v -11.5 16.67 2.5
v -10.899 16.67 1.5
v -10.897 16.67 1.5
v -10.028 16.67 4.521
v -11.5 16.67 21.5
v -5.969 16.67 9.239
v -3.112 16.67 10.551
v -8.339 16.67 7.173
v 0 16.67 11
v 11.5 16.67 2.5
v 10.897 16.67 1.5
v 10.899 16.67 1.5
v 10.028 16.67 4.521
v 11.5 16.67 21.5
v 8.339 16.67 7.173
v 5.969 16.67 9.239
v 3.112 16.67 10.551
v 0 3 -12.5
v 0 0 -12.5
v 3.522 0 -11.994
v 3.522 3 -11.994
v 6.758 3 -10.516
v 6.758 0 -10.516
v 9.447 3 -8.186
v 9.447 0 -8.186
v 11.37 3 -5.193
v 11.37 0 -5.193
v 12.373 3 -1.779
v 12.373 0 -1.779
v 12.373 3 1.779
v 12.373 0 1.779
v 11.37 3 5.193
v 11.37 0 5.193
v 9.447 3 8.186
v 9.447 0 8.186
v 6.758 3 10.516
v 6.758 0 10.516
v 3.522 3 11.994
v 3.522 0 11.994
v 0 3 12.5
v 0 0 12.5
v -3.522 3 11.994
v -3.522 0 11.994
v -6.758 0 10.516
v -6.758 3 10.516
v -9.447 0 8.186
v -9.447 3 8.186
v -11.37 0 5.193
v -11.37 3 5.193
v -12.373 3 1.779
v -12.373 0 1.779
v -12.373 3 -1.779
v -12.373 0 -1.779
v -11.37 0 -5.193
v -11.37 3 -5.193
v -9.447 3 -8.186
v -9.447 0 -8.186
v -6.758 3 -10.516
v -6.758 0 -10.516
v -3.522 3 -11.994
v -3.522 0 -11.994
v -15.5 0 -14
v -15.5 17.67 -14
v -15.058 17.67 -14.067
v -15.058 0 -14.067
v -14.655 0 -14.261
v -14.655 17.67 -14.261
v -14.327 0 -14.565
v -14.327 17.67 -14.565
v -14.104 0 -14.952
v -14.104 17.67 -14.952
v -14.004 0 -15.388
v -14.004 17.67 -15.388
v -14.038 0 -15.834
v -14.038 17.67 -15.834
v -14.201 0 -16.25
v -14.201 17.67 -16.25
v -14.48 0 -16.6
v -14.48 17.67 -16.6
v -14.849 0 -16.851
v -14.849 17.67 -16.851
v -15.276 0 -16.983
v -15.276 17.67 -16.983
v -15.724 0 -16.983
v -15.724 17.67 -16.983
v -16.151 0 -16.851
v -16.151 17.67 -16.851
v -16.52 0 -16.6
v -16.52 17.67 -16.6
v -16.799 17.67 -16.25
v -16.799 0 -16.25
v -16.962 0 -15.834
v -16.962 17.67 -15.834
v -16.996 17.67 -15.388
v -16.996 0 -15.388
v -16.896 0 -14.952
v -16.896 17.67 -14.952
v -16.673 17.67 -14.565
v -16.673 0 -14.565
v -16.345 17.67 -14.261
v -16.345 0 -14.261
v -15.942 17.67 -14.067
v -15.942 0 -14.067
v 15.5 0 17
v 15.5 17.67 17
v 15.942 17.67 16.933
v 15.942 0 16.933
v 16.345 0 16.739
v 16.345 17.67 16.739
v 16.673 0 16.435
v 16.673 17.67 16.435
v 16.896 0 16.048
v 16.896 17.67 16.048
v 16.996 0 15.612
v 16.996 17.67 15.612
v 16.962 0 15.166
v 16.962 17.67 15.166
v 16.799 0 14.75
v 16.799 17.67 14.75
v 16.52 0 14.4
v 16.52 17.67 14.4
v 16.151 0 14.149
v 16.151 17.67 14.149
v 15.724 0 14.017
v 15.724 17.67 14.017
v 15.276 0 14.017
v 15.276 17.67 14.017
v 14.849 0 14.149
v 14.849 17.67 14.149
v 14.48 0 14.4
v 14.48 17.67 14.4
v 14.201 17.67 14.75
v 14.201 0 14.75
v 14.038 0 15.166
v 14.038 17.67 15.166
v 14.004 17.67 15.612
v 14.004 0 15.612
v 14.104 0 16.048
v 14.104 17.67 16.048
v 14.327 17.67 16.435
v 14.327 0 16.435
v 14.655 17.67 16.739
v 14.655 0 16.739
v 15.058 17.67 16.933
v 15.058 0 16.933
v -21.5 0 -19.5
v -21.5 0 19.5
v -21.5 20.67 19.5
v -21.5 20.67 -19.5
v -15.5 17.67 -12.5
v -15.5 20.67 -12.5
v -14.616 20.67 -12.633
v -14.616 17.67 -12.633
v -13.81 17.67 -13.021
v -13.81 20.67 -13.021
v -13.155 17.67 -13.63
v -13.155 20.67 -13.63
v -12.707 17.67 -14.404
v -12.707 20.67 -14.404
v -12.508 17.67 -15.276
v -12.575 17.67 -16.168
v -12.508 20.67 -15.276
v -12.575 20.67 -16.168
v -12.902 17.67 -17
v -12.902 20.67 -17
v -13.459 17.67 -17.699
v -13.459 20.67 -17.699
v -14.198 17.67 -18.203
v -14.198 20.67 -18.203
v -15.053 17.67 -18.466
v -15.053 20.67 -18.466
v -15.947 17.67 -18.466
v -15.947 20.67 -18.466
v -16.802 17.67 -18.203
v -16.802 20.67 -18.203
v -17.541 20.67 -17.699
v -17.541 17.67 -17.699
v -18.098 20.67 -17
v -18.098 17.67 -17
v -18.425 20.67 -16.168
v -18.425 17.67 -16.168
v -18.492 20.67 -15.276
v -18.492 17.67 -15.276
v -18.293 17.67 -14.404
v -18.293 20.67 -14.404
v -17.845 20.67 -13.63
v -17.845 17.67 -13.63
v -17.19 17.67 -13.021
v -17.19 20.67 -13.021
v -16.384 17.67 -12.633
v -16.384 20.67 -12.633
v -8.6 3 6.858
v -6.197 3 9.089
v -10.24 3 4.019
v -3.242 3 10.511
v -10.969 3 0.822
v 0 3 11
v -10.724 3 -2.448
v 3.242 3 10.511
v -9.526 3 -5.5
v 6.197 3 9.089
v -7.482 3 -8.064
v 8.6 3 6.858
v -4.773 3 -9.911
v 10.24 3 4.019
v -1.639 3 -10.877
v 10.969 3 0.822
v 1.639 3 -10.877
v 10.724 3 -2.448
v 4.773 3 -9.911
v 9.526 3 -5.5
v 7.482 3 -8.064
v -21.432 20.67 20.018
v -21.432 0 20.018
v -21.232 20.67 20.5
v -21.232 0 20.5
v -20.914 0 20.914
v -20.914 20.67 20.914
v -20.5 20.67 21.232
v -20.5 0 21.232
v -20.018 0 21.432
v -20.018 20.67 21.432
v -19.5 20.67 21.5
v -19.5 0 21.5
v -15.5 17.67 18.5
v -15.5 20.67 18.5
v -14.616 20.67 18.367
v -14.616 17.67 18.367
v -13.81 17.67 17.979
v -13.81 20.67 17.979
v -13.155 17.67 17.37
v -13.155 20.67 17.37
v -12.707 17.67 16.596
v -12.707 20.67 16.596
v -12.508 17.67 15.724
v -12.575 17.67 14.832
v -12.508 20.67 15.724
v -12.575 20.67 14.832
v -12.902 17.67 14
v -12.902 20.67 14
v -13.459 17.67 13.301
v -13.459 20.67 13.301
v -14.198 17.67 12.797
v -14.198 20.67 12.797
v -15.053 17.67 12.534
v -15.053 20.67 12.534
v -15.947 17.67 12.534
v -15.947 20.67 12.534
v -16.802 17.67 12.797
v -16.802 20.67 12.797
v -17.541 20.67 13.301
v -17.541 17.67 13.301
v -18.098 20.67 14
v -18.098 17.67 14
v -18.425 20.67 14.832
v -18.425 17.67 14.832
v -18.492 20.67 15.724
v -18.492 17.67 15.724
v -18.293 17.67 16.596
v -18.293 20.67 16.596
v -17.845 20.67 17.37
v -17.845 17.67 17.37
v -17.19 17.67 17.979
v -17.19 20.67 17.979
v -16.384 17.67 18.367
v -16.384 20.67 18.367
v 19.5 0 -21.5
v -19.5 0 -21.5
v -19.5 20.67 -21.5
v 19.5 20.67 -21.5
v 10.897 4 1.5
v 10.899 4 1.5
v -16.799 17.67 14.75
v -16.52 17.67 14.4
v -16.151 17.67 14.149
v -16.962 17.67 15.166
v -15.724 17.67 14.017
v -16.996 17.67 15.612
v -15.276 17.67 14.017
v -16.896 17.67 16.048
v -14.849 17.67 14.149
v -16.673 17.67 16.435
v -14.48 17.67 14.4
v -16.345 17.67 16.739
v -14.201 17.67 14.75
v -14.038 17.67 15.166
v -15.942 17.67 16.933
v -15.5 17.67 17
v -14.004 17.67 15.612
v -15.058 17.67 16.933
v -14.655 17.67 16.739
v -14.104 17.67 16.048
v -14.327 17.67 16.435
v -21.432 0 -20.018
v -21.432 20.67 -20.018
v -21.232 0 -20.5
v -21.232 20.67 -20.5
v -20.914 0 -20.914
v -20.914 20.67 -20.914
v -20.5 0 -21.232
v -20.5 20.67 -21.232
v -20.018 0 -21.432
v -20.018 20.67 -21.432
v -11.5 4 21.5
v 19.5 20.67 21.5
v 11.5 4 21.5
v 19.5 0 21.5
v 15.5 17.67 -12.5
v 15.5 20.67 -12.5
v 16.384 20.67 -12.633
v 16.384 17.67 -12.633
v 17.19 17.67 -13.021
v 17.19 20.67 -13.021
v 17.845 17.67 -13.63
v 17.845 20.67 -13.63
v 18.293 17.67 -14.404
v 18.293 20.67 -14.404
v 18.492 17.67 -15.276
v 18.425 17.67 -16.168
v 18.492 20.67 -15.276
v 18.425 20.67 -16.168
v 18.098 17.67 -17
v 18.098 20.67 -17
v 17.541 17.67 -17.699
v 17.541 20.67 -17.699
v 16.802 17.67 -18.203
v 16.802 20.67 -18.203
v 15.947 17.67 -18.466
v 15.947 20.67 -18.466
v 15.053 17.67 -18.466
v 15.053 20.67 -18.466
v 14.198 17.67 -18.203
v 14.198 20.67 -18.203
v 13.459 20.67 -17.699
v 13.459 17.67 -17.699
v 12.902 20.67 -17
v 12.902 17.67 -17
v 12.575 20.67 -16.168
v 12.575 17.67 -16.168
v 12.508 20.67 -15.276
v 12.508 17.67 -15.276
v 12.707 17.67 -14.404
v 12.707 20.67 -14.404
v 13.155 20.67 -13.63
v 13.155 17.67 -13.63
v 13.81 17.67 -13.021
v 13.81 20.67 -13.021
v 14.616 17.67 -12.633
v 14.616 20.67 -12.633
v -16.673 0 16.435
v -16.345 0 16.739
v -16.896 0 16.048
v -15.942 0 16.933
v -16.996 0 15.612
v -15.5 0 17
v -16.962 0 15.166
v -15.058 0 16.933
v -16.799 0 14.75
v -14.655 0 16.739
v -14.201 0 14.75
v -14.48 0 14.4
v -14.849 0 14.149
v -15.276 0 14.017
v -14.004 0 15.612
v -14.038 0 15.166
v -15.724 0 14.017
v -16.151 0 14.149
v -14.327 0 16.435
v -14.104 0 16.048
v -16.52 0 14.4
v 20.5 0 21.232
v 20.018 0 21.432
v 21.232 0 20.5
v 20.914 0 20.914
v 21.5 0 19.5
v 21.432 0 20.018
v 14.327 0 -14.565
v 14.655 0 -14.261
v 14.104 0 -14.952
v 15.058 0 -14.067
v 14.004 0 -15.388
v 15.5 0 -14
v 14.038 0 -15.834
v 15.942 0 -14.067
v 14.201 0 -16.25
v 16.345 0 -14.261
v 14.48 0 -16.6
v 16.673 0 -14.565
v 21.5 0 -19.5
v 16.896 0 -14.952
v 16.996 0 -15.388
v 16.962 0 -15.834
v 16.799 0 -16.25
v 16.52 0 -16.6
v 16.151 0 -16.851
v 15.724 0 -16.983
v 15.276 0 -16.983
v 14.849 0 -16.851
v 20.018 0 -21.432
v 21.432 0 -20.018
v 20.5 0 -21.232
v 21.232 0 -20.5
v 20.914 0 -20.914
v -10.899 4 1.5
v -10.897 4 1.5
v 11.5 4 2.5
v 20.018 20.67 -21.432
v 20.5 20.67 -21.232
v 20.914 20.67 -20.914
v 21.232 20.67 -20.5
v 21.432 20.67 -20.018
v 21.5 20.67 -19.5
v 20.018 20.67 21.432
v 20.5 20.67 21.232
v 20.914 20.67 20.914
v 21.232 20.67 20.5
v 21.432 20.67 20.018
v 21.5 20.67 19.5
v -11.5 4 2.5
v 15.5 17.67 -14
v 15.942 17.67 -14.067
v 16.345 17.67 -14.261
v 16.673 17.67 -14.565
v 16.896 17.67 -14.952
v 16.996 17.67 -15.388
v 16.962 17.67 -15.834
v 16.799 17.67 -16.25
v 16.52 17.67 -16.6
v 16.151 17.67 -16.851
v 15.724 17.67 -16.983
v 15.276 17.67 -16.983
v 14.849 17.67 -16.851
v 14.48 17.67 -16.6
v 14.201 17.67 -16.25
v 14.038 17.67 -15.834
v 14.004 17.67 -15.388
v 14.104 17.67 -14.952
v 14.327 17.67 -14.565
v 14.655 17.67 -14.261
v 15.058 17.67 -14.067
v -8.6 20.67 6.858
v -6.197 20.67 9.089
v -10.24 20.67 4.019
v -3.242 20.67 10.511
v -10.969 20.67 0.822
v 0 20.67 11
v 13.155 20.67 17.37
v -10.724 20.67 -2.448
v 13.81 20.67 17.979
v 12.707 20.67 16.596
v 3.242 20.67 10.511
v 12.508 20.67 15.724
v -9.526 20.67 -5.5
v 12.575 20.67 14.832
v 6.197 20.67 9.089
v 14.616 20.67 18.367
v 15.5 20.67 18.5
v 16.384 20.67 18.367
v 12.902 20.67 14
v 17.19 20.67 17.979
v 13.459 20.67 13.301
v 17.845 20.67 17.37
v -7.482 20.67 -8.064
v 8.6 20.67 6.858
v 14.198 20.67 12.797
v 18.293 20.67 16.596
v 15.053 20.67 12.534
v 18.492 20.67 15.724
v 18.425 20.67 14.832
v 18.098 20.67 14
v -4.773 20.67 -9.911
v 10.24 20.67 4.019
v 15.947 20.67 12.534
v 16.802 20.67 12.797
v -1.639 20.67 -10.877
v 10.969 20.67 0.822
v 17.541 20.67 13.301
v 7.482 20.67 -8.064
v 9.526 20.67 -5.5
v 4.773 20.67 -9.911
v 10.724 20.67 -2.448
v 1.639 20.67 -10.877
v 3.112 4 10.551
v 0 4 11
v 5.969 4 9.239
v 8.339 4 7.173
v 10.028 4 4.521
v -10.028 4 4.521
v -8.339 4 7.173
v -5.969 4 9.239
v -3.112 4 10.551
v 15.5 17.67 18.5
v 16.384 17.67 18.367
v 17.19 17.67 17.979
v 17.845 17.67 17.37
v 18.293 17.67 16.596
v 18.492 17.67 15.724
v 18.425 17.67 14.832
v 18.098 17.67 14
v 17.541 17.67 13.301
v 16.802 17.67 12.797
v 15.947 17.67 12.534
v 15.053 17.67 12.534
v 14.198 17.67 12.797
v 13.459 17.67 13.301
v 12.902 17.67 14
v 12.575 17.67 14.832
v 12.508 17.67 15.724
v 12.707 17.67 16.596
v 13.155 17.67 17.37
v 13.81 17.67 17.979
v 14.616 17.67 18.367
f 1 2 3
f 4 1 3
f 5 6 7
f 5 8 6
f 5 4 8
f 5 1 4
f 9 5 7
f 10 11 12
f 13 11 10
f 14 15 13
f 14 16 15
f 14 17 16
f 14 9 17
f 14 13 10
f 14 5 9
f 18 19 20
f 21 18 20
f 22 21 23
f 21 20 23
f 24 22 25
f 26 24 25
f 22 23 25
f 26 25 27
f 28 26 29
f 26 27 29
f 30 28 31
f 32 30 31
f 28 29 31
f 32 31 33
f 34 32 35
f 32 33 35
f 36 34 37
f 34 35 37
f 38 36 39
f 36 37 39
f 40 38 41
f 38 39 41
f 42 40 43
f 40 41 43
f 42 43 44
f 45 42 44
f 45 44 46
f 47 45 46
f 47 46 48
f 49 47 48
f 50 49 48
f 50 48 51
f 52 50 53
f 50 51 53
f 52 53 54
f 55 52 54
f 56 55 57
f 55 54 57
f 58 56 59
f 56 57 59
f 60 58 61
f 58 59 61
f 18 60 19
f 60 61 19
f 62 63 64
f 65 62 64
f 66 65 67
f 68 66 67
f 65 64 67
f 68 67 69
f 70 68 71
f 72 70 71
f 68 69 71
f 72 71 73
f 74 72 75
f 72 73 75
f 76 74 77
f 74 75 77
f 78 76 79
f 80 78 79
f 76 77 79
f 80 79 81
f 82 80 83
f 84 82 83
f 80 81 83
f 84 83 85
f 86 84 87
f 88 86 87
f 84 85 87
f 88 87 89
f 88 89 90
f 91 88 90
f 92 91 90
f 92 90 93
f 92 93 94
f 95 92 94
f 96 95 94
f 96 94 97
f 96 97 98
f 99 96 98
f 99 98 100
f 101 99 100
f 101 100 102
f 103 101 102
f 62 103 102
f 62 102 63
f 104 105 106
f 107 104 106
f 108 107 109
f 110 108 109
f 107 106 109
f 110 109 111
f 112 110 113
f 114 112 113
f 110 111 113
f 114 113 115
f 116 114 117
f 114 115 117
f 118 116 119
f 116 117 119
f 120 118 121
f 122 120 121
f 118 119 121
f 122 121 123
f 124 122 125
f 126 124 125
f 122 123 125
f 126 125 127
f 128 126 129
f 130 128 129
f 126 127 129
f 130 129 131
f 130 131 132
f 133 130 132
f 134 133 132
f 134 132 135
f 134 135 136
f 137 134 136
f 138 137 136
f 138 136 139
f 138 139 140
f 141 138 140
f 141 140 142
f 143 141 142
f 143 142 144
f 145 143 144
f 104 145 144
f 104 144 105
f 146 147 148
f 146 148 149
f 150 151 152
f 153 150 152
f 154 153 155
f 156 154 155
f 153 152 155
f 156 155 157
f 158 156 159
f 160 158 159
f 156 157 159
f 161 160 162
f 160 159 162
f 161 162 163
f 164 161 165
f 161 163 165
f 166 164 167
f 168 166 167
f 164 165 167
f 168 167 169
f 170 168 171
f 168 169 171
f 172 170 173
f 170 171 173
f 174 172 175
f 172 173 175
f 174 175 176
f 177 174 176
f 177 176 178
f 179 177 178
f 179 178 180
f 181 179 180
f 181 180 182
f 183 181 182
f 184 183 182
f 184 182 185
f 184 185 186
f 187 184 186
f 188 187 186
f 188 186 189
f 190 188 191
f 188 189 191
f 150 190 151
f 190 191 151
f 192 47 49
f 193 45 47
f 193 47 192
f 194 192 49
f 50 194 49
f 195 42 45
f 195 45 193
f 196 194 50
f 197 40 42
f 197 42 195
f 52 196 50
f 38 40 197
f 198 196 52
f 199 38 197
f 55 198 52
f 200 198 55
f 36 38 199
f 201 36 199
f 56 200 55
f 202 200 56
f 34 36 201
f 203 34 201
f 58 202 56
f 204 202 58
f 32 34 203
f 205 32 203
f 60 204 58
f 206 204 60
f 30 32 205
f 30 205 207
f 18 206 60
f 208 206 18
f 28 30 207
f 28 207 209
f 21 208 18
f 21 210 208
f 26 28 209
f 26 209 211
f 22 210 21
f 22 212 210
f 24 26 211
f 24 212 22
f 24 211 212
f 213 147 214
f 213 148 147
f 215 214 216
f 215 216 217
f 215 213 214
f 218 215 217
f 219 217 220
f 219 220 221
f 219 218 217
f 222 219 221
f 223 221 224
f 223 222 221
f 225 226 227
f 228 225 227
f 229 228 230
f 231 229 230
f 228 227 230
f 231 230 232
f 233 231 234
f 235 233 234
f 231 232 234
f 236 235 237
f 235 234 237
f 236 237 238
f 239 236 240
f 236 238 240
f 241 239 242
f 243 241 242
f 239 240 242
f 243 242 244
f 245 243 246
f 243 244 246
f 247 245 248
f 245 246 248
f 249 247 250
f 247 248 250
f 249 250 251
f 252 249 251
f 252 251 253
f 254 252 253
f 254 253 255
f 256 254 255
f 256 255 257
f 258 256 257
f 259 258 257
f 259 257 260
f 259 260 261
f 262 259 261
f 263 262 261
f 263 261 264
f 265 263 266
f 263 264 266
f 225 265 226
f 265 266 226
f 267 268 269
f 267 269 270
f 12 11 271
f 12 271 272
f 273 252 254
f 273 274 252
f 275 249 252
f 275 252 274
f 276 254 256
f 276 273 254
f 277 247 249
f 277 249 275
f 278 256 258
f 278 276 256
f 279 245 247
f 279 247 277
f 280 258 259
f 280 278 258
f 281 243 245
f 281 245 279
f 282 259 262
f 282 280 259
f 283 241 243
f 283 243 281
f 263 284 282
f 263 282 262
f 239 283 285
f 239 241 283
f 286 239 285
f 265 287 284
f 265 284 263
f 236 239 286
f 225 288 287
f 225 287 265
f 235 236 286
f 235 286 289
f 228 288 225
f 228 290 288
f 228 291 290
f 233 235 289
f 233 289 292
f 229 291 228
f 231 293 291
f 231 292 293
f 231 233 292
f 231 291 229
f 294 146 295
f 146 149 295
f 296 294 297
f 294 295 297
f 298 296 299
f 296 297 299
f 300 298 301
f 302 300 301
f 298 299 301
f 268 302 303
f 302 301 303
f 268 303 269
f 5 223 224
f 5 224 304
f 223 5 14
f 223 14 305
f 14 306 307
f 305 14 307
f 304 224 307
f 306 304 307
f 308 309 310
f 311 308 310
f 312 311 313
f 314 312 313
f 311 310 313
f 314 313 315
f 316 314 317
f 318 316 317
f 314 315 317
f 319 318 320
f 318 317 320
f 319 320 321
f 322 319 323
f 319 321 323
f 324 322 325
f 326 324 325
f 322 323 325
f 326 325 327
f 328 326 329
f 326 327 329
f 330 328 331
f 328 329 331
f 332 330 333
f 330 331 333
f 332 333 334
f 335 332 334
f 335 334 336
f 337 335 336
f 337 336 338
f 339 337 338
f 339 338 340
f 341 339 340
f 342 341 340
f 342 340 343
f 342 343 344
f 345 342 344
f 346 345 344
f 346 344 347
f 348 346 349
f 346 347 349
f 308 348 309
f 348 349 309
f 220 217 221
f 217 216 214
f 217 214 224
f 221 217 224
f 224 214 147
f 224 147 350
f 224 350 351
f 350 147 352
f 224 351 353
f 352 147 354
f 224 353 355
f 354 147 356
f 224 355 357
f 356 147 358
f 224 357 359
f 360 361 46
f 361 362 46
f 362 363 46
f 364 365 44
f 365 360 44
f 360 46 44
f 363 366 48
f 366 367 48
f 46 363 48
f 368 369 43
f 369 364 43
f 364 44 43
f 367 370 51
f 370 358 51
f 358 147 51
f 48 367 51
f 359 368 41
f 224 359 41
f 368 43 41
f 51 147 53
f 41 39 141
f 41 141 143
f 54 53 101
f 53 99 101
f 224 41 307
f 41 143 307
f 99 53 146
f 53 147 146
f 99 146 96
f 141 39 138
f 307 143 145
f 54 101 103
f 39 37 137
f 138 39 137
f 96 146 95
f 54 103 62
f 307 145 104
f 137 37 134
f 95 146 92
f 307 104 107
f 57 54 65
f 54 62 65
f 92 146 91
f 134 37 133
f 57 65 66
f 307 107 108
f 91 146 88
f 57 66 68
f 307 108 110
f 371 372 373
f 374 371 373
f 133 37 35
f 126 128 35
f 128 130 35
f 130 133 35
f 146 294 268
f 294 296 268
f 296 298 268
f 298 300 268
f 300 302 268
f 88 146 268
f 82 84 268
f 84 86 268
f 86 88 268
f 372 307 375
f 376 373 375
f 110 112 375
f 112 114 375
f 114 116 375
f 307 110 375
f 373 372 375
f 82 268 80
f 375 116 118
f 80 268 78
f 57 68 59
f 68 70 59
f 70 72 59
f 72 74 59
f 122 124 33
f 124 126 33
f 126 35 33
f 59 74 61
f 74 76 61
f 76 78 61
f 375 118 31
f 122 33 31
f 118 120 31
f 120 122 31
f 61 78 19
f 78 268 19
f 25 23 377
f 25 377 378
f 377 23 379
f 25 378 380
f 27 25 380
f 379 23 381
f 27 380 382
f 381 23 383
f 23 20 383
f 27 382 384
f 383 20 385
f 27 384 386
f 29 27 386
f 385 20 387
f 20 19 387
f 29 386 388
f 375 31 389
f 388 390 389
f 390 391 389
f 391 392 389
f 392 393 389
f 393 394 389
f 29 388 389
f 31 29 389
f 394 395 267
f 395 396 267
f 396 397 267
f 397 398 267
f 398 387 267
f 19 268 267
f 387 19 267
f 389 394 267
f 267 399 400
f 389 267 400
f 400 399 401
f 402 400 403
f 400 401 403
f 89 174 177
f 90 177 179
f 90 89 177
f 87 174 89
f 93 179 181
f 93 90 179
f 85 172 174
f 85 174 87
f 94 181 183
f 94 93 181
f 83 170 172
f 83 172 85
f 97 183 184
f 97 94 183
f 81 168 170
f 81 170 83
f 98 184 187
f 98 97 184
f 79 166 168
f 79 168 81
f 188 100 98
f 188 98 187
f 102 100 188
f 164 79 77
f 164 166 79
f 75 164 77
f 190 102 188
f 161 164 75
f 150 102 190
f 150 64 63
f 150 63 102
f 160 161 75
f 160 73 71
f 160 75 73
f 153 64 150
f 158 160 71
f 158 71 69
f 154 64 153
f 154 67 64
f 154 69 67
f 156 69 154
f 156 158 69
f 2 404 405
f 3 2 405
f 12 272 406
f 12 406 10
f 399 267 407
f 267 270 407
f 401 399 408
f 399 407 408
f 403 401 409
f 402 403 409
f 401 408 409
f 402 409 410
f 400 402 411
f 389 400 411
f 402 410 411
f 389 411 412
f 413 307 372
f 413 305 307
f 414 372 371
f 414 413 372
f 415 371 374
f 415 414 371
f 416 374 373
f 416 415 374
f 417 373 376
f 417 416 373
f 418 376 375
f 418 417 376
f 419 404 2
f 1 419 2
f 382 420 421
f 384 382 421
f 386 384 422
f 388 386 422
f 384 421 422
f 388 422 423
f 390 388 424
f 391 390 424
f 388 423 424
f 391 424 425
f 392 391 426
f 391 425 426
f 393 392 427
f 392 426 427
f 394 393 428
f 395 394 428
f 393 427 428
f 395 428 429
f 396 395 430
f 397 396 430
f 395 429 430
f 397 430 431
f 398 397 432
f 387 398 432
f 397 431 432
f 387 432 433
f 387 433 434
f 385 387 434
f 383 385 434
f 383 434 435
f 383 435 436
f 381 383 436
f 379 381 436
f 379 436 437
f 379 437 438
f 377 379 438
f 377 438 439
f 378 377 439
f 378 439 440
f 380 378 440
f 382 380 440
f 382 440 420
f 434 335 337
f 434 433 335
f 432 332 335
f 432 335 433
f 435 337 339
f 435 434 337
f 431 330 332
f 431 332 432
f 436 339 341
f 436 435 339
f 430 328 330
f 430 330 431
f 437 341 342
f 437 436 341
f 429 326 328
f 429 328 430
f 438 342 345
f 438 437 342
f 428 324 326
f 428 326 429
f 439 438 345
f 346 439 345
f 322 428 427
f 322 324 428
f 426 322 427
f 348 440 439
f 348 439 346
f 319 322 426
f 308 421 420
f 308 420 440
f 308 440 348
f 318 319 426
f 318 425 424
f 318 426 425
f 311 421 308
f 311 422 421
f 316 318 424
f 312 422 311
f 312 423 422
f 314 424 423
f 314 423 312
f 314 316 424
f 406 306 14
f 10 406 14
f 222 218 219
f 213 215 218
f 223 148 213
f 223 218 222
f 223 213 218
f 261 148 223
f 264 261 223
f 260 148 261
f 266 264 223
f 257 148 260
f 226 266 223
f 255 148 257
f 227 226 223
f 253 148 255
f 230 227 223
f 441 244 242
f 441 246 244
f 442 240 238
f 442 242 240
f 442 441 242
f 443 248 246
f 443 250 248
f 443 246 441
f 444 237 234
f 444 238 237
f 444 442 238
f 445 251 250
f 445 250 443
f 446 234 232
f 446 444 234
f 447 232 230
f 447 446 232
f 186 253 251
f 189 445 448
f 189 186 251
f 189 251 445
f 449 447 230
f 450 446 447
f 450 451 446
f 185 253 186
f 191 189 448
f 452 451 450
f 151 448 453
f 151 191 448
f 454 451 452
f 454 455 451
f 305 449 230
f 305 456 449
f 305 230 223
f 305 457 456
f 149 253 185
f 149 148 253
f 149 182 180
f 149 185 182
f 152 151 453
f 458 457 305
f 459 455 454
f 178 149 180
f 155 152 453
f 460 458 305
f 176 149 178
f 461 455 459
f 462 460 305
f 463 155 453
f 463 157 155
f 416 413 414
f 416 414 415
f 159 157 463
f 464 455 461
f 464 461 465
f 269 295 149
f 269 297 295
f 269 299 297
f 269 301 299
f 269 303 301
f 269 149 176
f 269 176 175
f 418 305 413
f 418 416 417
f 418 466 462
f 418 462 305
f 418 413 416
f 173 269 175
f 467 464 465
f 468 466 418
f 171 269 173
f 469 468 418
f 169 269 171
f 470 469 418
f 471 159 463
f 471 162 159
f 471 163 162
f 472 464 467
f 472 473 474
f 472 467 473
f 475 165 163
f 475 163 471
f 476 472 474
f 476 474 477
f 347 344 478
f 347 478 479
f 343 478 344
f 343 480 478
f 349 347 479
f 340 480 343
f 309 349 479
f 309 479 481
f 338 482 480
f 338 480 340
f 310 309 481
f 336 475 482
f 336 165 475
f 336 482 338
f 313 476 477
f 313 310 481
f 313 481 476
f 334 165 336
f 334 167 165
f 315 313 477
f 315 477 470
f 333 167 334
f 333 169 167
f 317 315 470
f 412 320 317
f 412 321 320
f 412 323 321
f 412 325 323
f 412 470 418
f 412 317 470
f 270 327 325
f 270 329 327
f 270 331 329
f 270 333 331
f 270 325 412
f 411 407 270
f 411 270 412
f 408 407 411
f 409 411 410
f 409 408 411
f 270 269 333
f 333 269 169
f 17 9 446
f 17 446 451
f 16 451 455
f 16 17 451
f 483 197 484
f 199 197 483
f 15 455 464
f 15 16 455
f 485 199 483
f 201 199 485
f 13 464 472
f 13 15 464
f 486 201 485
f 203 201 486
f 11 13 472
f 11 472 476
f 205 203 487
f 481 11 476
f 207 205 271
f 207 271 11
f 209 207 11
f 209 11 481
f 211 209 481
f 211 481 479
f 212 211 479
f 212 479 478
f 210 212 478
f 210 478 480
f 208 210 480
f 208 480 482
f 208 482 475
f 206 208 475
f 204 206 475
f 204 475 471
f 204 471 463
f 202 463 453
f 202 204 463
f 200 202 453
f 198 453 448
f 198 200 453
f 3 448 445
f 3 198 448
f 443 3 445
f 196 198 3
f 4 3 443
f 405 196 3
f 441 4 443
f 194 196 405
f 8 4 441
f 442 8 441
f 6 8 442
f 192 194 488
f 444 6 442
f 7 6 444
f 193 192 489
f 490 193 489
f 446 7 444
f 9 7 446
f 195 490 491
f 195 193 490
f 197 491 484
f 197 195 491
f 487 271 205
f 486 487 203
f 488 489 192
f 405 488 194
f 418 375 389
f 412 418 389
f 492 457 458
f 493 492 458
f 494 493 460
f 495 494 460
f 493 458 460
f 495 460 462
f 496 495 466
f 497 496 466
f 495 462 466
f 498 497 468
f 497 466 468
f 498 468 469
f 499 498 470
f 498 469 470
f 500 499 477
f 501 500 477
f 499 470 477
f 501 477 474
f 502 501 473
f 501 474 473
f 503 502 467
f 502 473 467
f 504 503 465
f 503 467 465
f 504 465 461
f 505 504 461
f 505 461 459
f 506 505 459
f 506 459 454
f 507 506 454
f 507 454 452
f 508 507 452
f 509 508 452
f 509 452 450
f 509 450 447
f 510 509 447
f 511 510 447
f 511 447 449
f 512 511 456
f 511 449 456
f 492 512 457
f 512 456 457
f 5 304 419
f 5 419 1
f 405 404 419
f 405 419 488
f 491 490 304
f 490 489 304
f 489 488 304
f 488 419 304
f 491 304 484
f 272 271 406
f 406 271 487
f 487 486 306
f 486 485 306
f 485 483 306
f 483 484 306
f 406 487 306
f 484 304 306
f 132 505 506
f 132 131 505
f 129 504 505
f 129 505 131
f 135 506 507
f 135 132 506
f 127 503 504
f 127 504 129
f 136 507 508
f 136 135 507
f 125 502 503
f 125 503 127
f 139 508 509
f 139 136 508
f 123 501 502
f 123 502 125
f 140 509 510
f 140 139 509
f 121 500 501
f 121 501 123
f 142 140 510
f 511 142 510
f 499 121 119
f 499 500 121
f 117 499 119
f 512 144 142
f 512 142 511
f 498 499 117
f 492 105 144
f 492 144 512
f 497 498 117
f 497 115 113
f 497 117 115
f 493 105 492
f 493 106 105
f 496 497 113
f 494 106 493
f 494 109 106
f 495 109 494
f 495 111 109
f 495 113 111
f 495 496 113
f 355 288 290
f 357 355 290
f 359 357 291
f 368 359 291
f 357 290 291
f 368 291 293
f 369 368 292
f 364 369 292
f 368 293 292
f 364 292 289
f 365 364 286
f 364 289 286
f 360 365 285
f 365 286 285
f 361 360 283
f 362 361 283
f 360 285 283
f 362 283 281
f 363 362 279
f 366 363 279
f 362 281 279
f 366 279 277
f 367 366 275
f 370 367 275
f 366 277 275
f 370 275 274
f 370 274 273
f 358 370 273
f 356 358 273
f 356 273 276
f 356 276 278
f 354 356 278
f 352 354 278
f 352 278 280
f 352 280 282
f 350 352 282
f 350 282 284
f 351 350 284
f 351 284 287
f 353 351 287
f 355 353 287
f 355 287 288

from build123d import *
from OCP.BRepFilletAPI import BRepFilletAPI_MakeChamfer

# Parameters (mm, degrees)
SKETCH1_W           = 43
SKETCH1_H           = 43
SKETCH1_R           = 11
BOSS_EXTRUDE1_DEPTH = 20.67
SKETCH2_R           = 12.5
CUT_EXTRUDE1_DEPTH  = 3
SKETCH3_R           = 1.5
CUT_EXTRUDE2_DEPTH  = 37.766137953
SKETCH4_W           = 23
SKETCH4_H           = 12.67
CUT_EXTRUDE3_DEPTH  = 20
SKETCH5_R           = 3
CUT_EXTRUDE4_DEPTH  = 3
FILLET1_R           = 2
CHAMFER1_SIZE       = 1
CHAMFER1_SIZE2      = 0.600860619


with BuildPart() as part:
    # Sketch1 → Boss-Extrude1 (new body)
    with BuildSketch(Plane(origin=(0, 0, 0), x_dir=(1, 0, 0), z_dir=(0, 1, 0))):
        Rectangle(SKETCH1_W, SKETCH1_H)
        with Locations(Location((0, 0, 0), (0, 0, 270))):
            Circle(SKETCH1_R, mode=Mode.SUBTRACT)
    extrude(amount=BOSS_EXTRUDE1_DEPTH)

    # Sketch2 → Cut-Extrude1 (cut)
    with BuildSketch(Plane.XZ):
        with Locations(Location((0, 0, 0), (0, 0, 270))):
            Circle(SKETCH2_R)
    extrude(amount=-CUT_EXTRUDE1_DEPTH, mode=Mode.SUBTRACT)

    # Sketch3 → Cut-Extrude2 (cut, through all)
    with BuildSketch(Plane(origin=(0, 20.67, 0), x_dir=(1, 0, 0), z_dir=(0, 1, 0))):
        with Locations(Location((-15.5, 15.5, 0), (0, 0, 270))):
            Circle(SKETCH3_R)
        with Locations(Location((15.5, 15.5, 0), (0, 0, 270))):
            Circle(SKETCH3_R)
        with Locations(Location((15.5, -15.5, 0), (0, 0, 270))):
            Circle(SKETCH3_R)
        with Locations(Location((-15.5, -15.5, 0), (0, 0, 270))):
            Circle(SKETCH3_R)
    extrude(amount=-CUT_EXTRUDE2_DEPTH, mode=Mode.SUBTRACT)

    # Sketch4 → Cut-Extrude3 (cut)
    with BuildSketch(Plane.XY.offset(21.5)):
        with Locations((0, 10.335)):
            Rectangle(SKETCH4_W, SKETCH4_H)
    extrude(amount=-CUT_EXTRUDE3_DEPTH, mode=Mode.SUBTRACT)

    # Sketch5 → Cut-Extrude4 (cut)
    with BuildSketch(Plane(origin=(0, 20.67, 0), x_dir=(1, 0, 0), z_dir=(0, 1, 0))):
        with Locations(Location((-15.5, 15.5, 0), (0, 0, 270))):
            Circle(SKETCH5_R)
        with Locations(Location((15.5, 15.5, 0), (0, 0, 270))):
            Circle(SKETCH5_R)
        with Locations(Location((15.5, -15.5, 0), (0, 0, 270))):
            Circle(SKETCH5_R)
        with Locations(Location((-15.5, -15.5, 0), (0, 0, 270))):
            Circle(SKETCH5_R)
    extrude(amount=-CUT_EXTRUDE4_DEPTH, mode=Mode.SUBTRACT)

    # Fillet1
    fillet1_edges = [part.edges().sort_by_distance(p)[0] for p in [
        (21.5, 10.335, 21.5),
        (-21.5, 10.335, 21.5),
        (-21.5, 10.335, -21.5),
        (21.5, 10.335, -21.5),
    ]]
    fillet(fillet1_edges, radius=FILLET1_R)

    # Chamfer1: one chamfer whose edges measure the first distance from different faces: ONE call of the kernel's chamfer builder (chamfer() names one face for all edges)
    chamfer1_edges_1 = [part.edges().sort_by_distance(p)[0] for p in [
        (11.5, 10.335, 1.5),
    ]]
    chamfer1_side_1 = [part.faces().sort_by_distance(p)[0] for p in [
        (11.5, 10.335, 11.5),
    ]]
    chamfer1_edges_2 = [part.edges().sort_by_distance(p)[0] for p in [
        (-11.5, 10.335, 1.5),
    ]]
    chamfer1_side_2 = [part.faces().sort_by_distance(p)[0] for p in [
        (-11.5, 10.335, 11.5),
    ]]
    chamfer1 = BRepFilletAPI_MakeChamfer(part.part.solid().wrapped)
    for e in chamfer1_edges_1:
        chamfer1.Add(CHAMFER1_SIZE, CHAMFER1_SIZE2, e.wrapped, chamfer1_side_1[0].wrapped)  # the first distance lies on this face
    for e in chamfer1_edges_2:
        chamfer1.Add(CHAMFER1_SIZE, CHAMFER1_SIZE2, e.wrapped, chamfer1_side_2[0].wrapped)  # the first distance lies on this face
    add(Compound.cast(chamfer1.Shape()), mode=Mode.REPLACE)


solid = part.part
